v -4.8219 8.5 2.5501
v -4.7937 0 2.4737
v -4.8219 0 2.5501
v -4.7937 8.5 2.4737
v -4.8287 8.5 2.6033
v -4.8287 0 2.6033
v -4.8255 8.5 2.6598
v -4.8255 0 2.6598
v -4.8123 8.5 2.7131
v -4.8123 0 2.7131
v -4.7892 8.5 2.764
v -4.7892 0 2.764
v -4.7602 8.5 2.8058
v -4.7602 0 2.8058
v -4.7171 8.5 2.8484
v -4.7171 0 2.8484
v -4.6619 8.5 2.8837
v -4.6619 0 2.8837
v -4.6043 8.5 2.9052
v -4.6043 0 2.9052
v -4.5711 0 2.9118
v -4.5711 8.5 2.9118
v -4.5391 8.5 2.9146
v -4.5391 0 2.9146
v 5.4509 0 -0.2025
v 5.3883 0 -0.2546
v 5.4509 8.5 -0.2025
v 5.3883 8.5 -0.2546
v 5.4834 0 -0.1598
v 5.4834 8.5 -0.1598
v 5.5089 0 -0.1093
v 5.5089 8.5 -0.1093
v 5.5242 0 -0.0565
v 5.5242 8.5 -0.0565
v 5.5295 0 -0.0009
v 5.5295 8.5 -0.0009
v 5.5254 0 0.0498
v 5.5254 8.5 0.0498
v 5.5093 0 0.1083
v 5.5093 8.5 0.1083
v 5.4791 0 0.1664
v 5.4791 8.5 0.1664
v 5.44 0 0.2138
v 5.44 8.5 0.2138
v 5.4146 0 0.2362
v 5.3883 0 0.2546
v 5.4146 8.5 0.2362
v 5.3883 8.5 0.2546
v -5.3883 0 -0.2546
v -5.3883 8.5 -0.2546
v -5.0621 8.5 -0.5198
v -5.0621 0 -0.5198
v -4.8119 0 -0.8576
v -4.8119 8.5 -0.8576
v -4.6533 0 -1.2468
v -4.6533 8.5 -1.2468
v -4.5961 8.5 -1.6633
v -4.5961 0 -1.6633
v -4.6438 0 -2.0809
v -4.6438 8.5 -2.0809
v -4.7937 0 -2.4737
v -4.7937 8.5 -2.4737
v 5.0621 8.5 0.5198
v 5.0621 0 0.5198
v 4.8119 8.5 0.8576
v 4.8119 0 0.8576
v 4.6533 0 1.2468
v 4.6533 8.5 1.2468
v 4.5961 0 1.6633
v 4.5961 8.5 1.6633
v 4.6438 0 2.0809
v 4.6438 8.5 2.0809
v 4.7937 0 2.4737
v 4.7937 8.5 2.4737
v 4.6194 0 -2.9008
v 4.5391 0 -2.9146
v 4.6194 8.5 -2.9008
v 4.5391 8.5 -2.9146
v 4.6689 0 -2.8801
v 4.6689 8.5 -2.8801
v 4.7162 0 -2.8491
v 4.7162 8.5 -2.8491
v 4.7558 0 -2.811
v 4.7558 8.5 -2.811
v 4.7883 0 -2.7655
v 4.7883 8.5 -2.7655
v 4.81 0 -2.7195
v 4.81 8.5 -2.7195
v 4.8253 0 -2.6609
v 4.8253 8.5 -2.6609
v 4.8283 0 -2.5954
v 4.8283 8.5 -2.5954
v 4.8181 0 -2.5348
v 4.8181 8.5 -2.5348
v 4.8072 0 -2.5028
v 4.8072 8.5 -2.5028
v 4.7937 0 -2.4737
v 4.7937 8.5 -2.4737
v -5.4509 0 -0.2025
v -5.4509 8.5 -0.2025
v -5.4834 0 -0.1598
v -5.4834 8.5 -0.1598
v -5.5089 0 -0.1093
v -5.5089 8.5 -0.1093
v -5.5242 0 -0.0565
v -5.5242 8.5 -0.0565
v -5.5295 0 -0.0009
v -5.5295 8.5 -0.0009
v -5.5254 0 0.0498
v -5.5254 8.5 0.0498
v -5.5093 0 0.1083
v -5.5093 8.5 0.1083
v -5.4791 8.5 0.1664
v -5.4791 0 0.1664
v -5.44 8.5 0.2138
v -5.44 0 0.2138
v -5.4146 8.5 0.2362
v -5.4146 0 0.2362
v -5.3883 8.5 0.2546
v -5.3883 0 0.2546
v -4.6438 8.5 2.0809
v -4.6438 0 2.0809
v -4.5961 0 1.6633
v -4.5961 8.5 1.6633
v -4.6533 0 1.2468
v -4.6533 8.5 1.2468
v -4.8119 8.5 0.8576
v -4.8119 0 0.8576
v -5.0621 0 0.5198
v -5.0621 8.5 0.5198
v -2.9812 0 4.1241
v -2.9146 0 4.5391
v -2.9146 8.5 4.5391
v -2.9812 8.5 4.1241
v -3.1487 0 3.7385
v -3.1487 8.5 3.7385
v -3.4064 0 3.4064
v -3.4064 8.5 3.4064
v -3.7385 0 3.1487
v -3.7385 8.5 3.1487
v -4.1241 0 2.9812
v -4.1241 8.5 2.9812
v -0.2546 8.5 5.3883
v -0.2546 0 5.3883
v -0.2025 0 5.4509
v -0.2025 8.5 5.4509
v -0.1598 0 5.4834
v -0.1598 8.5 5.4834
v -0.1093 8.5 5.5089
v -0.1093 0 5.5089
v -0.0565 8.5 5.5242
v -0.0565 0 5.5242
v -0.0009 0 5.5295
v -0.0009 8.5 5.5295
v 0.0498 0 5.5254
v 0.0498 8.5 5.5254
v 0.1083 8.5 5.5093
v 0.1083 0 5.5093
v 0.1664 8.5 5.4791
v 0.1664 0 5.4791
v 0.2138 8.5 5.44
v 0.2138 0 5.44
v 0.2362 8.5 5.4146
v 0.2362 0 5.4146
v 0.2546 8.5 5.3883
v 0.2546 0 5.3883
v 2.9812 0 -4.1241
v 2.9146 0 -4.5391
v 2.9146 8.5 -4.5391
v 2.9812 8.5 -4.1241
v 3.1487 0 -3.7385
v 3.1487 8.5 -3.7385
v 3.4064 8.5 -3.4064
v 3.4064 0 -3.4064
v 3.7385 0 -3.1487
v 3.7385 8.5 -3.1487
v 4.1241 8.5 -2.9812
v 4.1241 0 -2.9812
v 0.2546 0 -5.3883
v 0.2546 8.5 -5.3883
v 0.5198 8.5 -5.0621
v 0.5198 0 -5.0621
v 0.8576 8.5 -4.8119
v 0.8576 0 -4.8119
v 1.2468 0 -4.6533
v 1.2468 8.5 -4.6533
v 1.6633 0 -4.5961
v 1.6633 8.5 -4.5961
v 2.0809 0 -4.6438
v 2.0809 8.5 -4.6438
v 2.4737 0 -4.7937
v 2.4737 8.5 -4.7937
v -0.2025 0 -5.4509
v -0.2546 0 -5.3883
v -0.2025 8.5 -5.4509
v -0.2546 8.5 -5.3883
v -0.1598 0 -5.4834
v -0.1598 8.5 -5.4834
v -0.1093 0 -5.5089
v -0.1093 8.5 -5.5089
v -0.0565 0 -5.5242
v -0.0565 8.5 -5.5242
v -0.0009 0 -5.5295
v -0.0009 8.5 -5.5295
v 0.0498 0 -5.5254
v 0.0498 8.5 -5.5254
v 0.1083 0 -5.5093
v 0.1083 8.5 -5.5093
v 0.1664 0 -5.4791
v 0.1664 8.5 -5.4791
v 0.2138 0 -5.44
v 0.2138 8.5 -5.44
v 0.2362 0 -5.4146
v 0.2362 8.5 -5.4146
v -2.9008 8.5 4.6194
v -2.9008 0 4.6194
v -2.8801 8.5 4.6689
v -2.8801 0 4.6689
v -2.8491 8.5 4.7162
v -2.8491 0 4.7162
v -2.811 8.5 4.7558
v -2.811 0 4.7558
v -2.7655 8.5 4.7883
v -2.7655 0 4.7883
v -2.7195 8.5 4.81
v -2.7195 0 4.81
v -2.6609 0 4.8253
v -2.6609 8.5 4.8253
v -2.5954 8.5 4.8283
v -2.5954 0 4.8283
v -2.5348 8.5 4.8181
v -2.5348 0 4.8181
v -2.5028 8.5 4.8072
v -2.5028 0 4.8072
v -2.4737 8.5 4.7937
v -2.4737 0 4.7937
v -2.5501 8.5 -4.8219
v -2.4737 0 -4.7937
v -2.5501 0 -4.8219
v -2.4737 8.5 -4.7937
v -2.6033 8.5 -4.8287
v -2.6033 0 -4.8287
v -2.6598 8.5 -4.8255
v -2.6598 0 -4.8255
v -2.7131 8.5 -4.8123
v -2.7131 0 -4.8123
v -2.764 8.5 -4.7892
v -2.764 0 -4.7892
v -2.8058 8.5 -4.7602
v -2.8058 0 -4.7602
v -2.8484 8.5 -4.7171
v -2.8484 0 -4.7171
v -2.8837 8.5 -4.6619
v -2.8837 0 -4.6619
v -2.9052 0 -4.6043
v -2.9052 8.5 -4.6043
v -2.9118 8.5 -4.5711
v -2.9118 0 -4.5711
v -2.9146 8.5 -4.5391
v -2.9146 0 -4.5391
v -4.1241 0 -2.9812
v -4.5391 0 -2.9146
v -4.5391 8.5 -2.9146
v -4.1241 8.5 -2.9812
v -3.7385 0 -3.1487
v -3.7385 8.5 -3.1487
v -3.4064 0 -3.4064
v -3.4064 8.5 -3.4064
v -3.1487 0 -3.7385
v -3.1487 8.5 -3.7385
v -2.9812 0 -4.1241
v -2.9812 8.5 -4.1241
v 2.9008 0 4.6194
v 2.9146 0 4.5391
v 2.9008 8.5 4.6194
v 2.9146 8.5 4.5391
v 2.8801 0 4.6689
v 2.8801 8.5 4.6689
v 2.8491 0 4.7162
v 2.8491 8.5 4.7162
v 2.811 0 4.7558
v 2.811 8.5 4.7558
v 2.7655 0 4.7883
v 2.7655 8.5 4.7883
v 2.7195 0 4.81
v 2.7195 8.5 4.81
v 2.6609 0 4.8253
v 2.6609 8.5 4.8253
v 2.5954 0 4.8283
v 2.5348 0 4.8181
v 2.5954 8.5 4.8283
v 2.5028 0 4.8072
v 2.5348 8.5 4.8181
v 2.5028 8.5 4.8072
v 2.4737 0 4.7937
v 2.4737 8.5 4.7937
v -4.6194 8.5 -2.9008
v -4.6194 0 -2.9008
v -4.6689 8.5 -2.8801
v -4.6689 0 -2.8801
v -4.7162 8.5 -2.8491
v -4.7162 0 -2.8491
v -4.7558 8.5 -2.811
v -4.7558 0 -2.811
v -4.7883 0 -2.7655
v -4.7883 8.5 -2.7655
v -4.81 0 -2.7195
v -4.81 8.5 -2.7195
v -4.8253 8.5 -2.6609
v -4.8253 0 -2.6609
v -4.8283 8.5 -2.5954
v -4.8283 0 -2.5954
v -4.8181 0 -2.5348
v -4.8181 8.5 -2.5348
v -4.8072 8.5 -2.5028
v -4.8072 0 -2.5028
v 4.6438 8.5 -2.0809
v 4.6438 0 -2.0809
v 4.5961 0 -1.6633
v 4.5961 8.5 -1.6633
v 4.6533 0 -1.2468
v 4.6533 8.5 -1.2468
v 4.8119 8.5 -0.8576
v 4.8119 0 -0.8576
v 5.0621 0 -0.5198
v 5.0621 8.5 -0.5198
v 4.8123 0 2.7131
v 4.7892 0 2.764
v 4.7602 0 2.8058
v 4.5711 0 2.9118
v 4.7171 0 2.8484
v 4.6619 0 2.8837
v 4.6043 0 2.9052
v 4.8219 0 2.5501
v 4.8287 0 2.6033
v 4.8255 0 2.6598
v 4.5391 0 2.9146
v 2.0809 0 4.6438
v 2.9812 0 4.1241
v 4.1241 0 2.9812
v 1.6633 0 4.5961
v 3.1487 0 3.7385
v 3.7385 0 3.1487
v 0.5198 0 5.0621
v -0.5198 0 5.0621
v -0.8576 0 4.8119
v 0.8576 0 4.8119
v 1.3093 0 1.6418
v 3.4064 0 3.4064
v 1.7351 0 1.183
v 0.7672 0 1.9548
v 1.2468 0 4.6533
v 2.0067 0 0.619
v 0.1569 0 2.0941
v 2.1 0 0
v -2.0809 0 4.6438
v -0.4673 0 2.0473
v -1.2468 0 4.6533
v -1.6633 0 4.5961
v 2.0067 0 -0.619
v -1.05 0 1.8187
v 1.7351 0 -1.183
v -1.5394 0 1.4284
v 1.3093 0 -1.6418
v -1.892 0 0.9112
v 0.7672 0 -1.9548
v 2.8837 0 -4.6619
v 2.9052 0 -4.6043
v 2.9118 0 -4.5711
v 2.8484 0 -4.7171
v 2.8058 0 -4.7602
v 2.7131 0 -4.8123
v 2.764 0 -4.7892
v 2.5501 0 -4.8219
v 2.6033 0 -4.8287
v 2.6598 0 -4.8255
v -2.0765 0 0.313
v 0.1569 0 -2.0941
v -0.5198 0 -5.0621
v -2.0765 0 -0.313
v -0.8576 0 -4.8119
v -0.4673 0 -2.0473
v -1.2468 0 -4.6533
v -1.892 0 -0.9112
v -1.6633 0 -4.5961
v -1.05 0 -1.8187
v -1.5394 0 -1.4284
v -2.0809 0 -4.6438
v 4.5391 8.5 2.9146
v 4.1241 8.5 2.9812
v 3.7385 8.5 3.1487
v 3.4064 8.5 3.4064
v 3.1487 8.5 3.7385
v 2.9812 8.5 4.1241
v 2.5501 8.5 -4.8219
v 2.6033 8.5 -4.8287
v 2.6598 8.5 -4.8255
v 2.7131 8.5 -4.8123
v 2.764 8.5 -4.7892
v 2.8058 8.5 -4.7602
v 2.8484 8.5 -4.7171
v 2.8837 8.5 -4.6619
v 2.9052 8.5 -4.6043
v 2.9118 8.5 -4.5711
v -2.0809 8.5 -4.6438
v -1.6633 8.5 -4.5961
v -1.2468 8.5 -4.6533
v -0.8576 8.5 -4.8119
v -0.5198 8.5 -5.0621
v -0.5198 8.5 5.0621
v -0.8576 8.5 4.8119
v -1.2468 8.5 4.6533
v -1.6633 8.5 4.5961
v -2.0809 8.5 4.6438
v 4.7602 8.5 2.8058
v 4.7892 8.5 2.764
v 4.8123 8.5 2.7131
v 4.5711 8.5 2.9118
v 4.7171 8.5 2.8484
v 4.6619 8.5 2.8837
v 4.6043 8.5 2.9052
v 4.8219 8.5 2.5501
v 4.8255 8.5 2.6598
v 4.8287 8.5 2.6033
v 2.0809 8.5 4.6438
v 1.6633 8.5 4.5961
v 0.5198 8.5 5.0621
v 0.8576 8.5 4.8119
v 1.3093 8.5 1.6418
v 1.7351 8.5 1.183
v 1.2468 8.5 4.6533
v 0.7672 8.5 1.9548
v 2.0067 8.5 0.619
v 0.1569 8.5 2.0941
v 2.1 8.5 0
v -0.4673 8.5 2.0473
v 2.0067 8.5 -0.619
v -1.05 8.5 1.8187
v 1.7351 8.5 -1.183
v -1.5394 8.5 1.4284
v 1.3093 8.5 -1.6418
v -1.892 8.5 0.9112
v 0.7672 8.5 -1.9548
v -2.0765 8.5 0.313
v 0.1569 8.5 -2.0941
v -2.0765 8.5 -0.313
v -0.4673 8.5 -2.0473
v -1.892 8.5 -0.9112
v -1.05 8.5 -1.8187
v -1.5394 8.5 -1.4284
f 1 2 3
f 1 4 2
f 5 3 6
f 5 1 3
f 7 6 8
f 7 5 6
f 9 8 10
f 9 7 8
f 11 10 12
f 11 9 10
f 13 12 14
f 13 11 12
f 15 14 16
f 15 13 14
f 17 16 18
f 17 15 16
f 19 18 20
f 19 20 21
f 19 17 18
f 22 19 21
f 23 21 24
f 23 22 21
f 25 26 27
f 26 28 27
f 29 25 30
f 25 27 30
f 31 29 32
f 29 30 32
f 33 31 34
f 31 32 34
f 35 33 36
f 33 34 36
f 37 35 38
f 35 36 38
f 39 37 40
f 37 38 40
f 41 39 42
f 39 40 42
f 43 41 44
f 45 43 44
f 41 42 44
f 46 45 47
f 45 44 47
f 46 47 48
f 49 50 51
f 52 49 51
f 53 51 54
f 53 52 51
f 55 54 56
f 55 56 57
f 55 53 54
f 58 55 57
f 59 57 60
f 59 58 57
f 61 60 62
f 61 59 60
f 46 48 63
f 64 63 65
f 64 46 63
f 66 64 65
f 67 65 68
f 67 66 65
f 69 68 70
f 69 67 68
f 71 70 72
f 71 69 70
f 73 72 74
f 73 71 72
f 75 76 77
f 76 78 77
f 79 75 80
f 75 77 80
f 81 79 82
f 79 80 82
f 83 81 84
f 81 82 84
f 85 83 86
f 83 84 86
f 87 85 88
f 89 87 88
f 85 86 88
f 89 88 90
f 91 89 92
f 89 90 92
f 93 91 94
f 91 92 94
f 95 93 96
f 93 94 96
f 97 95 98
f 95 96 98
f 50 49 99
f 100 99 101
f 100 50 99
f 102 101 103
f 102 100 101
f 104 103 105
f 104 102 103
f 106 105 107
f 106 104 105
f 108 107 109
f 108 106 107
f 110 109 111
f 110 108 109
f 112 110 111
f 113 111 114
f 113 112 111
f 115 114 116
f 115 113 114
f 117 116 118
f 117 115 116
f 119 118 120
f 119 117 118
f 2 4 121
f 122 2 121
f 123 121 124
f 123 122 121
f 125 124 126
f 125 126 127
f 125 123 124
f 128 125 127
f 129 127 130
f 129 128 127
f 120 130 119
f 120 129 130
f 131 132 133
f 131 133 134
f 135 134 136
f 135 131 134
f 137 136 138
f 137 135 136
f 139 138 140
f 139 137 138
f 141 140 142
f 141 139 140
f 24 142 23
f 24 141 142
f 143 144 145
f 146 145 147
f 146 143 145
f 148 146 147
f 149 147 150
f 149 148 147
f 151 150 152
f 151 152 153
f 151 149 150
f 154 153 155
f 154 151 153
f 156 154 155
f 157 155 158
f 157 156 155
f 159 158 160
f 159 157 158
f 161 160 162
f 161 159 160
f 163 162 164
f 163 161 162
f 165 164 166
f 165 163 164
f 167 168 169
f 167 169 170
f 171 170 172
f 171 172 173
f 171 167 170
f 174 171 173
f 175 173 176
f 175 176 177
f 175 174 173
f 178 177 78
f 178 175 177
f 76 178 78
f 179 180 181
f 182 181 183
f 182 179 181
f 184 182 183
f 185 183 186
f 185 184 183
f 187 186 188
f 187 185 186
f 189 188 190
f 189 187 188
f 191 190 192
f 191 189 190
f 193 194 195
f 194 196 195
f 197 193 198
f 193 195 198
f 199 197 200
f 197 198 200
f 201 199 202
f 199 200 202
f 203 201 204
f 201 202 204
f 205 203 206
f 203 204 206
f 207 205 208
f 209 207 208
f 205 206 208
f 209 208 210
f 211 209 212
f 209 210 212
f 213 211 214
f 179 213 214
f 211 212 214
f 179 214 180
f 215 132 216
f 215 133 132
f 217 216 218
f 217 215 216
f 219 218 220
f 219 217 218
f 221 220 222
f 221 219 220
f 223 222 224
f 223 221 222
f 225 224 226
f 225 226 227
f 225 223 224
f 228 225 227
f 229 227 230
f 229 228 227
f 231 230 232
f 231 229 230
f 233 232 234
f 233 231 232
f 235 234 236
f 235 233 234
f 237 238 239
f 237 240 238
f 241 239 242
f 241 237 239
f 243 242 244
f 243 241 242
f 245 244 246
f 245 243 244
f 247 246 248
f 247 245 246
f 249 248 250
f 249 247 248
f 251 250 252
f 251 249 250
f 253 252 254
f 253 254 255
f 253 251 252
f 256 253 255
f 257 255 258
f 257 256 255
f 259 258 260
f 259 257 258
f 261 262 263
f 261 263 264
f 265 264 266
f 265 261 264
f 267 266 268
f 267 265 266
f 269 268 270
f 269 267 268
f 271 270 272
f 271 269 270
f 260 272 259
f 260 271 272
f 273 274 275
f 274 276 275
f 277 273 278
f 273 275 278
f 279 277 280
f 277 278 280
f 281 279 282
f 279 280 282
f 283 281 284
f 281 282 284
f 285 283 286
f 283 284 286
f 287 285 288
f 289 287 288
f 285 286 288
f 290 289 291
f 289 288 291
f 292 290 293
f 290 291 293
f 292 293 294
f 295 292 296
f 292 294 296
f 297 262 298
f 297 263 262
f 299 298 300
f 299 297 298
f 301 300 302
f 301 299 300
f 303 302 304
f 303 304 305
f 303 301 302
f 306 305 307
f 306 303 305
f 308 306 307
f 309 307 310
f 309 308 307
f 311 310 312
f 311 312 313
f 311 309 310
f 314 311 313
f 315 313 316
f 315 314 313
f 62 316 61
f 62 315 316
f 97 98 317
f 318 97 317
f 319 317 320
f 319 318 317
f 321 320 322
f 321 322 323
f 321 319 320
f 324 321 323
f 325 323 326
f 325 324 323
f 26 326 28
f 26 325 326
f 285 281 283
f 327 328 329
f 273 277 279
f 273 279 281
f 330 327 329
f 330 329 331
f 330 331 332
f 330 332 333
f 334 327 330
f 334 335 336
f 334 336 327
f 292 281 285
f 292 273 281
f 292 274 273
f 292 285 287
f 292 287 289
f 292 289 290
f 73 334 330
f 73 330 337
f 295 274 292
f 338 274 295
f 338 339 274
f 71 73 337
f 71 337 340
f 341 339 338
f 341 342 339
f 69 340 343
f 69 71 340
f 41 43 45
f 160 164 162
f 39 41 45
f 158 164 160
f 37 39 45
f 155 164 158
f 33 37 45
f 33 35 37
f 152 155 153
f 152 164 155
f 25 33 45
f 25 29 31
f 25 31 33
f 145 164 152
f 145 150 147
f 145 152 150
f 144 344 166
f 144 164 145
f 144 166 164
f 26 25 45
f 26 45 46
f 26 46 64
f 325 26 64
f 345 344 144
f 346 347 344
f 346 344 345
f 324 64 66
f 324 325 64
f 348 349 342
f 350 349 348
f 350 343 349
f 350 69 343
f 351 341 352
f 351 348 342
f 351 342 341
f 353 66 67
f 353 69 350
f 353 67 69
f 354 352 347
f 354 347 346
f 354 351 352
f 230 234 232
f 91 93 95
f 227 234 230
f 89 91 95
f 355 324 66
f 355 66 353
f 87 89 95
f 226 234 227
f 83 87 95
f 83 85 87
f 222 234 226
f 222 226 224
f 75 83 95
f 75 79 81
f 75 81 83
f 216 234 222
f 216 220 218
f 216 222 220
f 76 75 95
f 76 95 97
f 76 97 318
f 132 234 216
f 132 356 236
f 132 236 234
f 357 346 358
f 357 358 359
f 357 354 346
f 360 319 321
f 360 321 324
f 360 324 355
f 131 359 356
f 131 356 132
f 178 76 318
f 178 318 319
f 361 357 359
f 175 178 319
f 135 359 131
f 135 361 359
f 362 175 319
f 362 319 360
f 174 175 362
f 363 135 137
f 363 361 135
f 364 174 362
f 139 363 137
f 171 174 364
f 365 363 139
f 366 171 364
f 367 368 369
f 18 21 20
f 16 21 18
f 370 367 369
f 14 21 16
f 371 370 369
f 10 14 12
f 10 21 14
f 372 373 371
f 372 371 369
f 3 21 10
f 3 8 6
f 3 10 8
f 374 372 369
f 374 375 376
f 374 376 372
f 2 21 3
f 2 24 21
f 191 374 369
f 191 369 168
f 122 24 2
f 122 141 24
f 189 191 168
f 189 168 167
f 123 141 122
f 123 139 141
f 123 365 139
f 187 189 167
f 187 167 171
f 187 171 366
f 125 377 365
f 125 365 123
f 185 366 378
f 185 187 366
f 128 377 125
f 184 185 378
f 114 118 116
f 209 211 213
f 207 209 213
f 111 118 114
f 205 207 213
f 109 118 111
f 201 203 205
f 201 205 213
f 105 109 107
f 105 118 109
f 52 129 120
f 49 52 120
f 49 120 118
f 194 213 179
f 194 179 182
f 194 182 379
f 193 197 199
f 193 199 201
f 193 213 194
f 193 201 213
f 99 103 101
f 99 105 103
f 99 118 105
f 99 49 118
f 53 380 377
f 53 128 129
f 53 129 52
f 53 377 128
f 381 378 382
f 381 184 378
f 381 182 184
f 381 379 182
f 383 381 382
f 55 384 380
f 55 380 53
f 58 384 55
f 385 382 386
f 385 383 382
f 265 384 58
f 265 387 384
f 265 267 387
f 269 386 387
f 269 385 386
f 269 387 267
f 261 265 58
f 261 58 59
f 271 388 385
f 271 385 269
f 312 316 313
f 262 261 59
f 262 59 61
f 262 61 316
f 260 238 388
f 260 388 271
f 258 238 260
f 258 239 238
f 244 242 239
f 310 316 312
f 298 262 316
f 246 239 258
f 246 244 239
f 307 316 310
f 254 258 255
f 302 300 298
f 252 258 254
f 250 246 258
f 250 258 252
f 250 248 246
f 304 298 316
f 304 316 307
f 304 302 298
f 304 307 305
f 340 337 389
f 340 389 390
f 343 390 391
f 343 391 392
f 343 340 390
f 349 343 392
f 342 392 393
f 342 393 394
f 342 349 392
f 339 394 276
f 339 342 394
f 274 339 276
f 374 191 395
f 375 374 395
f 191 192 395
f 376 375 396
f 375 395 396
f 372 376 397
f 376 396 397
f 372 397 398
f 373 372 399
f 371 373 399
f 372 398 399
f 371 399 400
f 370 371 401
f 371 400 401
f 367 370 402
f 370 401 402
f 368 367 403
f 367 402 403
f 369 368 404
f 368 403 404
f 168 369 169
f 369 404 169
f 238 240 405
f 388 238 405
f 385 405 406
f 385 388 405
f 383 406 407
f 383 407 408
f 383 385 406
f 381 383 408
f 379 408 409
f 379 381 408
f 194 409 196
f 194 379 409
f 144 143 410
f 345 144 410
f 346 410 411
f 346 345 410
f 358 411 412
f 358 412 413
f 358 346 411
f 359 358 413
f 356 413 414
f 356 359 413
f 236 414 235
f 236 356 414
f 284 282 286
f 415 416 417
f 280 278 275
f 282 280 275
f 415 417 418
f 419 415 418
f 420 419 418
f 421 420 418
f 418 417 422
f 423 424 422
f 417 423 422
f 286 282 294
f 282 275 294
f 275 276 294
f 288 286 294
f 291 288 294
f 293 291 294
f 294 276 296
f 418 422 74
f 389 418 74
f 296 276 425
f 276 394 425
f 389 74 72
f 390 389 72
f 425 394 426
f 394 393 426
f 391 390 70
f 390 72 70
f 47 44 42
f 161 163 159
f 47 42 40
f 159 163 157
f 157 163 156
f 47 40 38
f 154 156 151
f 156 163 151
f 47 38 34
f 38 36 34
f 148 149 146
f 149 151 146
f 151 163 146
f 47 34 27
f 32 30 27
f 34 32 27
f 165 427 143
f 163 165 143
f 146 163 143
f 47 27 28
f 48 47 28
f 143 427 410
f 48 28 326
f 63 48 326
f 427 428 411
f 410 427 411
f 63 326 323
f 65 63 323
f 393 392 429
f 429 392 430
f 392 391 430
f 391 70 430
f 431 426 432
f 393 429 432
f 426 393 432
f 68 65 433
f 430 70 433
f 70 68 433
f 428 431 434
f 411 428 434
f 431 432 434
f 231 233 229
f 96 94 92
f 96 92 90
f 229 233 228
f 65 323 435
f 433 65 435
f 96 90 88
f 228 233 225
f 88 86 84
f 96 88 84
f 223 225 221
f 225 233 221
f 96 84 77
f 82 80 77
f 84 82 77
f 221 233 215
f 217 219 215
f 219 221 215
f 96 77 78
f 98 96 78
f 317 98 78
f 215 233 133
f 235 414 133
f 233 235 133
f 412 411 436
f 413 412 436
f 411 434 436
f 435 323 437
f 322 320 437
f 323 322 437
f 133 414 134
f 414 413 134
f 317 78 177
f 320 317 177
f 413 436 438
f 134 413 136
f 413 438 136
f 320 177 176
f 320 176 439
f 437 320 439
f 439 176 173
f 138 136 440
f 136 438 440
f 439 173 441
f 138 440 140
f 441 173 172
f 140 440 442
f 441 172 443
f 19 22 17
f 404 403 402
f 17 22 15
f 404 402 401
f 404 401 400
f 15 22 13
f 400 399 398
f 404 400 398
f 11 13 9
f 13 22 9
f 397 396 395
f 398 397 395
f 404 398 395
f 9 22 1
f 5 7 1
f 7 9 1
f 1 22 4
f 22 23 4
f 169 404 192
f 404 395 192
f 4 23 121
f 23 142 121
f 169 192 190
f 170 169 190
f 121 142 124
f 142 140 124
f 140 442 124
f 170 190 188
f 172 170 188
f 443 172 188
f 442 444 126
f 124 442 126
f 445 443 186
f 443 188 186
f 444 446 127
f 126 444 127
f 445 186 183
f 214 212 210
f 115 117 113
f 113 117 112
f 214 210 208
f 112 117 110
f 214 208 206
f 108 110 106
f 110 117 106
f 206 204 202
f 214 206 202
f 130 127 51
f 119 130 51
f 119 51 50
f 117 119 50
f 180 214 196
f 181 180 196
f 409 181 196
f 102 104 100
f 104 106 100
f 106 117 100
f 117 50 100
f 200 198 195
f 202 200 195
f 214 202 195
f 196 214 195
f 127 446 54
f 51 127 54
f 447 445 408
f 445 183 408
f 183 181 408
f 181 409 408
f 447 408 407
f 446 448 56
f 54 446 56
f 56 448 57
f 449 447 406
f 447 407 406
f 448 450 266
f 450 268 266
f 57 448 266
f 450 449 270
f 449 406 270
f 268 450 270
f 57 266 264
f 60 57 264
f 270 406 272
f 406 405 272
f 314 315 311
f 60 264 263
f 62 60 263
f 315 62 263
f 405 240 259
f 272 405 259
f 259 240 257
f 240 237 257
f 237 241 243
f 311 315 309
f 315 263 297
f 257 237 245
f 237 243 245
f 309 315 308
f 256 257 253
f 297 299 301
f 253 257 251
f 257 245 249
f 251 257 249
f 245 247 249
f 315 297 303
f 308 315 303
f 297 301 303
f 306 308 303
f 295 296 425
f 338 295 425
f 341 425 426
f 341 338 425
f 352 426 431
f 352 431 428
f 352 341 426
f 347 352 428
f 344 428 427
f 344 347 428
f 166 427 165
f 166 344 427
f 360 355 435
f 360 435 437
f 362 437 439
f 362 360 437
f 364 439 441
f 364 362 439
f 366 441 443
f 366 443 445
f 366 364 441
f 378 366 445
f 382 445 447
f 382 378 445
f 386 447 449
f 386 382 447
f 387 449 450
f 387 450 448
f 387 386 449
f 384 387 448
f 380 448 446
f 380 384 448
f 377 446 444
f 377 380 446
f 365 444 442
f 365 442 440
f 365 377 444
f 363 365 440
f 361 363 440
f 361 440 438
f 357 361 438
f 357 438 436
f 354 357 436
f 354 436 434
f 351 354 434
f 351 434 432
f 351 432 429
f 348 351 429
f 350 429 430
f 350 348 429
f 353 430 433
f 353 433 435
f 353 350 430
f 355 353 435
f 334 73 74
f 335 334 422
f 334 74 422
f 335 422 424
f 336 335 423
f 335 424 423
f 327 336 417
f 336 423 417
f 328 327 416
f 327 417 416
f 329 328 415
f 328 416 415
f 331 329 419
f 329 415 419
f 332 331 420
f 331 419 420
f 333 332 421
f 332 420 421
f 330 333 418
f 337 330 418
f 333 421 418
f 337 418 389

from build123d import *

# Parameters (mm, degrees)
SKETCH_1_R      = 2.1
EXTRUDE_1_DEPTH = 8.5
FILLET_1_R      = 0.3


with BuildPart() as part:
    # 草图1 → 凸台-拉伸1 (new body)
    with BuildSketch(Plane(origin=(0, 0, 0), x_dir=(1, 0, 0), z_dir=(0, 1, 0))):
        with BuildLine():
            ThreePointArc((-3.125, 5.412658774), (-1.246843801, 4.653284414), (0, 6.25))
            ThreePointArc((0, 6.25), (1.246843801, 4.653284414), (3.125, 5.412658774))
            ThreePointArc((3.125, 5.412658774), (3.406440613, 3.406440613), (5.412658774, 3.125))
            ThreePointArc((5.412658774, 3.125), (4.653284414, 1.246843801), (6.25, 0))
            ThreePointArc((6.25, 0), (4.653284414, -1.246843801), (5.412658774, -3.125))
            ThreePointArc((5.412658774, -3.125), (3.406440613, -3.406440613), (3.125, -5.412658774))
            ThreePointArc((3.125, -5.412658774), (1.246843801, -4.653284414), (0, -6.25))
            ThreePointArc((0, -6.25), (-1.246843801, -4.653284414), (-3.125, -5.412658774))
            ThreePointArc((-3.125, -5.412658774), (-3.406440613, -3.406440613), (-5.412658774, -3.125))
            ThreePointArc((-5.412658774, -3.125), (-4.653284414, -1.246843801), (-6.25, 0))
            ThreePointArc((-6.25, 0), (-4.653284414, 1.246843801), (-5.412658774, 3.125))
            ThreePointArc((-5.412658774, 3.125), (-3.406440613, 3.406440613), (-3.125, 5.412658774))
        make_face()
        Circle(SKETCH_1_R, mode=Mode.SUBTRACT)
    extrude(amount=EXTRUDE_1_DEPTH)

    # 圆角1
    fillet_1_edges = [part.edges().sort_by_distance(p)[0] for p in [
        (-3.125, 4.25, -5.412658774),
        (0, 4.25, -6.25),
        (3.125, 4.25, -5.412658774),
        (5.412658774, 4.25, -3.125),
        (6.25, 4.25, 0),
        (5.412658774, 4.25, 3.125),
        (3.125, 4.25, 5.412658774),
        (0, 4.25, 6.25),
        (-3.125, 4.25, 5.412658774),
        (-5.412658774, 4.25, 3.125),
        (-6.25, 4.25, 0),
        (-5.412658774, 4.25, -3.125),
    ]]
    fillet(fillet_1_edges, radius=FILLET_1_R)


solid = part.part
